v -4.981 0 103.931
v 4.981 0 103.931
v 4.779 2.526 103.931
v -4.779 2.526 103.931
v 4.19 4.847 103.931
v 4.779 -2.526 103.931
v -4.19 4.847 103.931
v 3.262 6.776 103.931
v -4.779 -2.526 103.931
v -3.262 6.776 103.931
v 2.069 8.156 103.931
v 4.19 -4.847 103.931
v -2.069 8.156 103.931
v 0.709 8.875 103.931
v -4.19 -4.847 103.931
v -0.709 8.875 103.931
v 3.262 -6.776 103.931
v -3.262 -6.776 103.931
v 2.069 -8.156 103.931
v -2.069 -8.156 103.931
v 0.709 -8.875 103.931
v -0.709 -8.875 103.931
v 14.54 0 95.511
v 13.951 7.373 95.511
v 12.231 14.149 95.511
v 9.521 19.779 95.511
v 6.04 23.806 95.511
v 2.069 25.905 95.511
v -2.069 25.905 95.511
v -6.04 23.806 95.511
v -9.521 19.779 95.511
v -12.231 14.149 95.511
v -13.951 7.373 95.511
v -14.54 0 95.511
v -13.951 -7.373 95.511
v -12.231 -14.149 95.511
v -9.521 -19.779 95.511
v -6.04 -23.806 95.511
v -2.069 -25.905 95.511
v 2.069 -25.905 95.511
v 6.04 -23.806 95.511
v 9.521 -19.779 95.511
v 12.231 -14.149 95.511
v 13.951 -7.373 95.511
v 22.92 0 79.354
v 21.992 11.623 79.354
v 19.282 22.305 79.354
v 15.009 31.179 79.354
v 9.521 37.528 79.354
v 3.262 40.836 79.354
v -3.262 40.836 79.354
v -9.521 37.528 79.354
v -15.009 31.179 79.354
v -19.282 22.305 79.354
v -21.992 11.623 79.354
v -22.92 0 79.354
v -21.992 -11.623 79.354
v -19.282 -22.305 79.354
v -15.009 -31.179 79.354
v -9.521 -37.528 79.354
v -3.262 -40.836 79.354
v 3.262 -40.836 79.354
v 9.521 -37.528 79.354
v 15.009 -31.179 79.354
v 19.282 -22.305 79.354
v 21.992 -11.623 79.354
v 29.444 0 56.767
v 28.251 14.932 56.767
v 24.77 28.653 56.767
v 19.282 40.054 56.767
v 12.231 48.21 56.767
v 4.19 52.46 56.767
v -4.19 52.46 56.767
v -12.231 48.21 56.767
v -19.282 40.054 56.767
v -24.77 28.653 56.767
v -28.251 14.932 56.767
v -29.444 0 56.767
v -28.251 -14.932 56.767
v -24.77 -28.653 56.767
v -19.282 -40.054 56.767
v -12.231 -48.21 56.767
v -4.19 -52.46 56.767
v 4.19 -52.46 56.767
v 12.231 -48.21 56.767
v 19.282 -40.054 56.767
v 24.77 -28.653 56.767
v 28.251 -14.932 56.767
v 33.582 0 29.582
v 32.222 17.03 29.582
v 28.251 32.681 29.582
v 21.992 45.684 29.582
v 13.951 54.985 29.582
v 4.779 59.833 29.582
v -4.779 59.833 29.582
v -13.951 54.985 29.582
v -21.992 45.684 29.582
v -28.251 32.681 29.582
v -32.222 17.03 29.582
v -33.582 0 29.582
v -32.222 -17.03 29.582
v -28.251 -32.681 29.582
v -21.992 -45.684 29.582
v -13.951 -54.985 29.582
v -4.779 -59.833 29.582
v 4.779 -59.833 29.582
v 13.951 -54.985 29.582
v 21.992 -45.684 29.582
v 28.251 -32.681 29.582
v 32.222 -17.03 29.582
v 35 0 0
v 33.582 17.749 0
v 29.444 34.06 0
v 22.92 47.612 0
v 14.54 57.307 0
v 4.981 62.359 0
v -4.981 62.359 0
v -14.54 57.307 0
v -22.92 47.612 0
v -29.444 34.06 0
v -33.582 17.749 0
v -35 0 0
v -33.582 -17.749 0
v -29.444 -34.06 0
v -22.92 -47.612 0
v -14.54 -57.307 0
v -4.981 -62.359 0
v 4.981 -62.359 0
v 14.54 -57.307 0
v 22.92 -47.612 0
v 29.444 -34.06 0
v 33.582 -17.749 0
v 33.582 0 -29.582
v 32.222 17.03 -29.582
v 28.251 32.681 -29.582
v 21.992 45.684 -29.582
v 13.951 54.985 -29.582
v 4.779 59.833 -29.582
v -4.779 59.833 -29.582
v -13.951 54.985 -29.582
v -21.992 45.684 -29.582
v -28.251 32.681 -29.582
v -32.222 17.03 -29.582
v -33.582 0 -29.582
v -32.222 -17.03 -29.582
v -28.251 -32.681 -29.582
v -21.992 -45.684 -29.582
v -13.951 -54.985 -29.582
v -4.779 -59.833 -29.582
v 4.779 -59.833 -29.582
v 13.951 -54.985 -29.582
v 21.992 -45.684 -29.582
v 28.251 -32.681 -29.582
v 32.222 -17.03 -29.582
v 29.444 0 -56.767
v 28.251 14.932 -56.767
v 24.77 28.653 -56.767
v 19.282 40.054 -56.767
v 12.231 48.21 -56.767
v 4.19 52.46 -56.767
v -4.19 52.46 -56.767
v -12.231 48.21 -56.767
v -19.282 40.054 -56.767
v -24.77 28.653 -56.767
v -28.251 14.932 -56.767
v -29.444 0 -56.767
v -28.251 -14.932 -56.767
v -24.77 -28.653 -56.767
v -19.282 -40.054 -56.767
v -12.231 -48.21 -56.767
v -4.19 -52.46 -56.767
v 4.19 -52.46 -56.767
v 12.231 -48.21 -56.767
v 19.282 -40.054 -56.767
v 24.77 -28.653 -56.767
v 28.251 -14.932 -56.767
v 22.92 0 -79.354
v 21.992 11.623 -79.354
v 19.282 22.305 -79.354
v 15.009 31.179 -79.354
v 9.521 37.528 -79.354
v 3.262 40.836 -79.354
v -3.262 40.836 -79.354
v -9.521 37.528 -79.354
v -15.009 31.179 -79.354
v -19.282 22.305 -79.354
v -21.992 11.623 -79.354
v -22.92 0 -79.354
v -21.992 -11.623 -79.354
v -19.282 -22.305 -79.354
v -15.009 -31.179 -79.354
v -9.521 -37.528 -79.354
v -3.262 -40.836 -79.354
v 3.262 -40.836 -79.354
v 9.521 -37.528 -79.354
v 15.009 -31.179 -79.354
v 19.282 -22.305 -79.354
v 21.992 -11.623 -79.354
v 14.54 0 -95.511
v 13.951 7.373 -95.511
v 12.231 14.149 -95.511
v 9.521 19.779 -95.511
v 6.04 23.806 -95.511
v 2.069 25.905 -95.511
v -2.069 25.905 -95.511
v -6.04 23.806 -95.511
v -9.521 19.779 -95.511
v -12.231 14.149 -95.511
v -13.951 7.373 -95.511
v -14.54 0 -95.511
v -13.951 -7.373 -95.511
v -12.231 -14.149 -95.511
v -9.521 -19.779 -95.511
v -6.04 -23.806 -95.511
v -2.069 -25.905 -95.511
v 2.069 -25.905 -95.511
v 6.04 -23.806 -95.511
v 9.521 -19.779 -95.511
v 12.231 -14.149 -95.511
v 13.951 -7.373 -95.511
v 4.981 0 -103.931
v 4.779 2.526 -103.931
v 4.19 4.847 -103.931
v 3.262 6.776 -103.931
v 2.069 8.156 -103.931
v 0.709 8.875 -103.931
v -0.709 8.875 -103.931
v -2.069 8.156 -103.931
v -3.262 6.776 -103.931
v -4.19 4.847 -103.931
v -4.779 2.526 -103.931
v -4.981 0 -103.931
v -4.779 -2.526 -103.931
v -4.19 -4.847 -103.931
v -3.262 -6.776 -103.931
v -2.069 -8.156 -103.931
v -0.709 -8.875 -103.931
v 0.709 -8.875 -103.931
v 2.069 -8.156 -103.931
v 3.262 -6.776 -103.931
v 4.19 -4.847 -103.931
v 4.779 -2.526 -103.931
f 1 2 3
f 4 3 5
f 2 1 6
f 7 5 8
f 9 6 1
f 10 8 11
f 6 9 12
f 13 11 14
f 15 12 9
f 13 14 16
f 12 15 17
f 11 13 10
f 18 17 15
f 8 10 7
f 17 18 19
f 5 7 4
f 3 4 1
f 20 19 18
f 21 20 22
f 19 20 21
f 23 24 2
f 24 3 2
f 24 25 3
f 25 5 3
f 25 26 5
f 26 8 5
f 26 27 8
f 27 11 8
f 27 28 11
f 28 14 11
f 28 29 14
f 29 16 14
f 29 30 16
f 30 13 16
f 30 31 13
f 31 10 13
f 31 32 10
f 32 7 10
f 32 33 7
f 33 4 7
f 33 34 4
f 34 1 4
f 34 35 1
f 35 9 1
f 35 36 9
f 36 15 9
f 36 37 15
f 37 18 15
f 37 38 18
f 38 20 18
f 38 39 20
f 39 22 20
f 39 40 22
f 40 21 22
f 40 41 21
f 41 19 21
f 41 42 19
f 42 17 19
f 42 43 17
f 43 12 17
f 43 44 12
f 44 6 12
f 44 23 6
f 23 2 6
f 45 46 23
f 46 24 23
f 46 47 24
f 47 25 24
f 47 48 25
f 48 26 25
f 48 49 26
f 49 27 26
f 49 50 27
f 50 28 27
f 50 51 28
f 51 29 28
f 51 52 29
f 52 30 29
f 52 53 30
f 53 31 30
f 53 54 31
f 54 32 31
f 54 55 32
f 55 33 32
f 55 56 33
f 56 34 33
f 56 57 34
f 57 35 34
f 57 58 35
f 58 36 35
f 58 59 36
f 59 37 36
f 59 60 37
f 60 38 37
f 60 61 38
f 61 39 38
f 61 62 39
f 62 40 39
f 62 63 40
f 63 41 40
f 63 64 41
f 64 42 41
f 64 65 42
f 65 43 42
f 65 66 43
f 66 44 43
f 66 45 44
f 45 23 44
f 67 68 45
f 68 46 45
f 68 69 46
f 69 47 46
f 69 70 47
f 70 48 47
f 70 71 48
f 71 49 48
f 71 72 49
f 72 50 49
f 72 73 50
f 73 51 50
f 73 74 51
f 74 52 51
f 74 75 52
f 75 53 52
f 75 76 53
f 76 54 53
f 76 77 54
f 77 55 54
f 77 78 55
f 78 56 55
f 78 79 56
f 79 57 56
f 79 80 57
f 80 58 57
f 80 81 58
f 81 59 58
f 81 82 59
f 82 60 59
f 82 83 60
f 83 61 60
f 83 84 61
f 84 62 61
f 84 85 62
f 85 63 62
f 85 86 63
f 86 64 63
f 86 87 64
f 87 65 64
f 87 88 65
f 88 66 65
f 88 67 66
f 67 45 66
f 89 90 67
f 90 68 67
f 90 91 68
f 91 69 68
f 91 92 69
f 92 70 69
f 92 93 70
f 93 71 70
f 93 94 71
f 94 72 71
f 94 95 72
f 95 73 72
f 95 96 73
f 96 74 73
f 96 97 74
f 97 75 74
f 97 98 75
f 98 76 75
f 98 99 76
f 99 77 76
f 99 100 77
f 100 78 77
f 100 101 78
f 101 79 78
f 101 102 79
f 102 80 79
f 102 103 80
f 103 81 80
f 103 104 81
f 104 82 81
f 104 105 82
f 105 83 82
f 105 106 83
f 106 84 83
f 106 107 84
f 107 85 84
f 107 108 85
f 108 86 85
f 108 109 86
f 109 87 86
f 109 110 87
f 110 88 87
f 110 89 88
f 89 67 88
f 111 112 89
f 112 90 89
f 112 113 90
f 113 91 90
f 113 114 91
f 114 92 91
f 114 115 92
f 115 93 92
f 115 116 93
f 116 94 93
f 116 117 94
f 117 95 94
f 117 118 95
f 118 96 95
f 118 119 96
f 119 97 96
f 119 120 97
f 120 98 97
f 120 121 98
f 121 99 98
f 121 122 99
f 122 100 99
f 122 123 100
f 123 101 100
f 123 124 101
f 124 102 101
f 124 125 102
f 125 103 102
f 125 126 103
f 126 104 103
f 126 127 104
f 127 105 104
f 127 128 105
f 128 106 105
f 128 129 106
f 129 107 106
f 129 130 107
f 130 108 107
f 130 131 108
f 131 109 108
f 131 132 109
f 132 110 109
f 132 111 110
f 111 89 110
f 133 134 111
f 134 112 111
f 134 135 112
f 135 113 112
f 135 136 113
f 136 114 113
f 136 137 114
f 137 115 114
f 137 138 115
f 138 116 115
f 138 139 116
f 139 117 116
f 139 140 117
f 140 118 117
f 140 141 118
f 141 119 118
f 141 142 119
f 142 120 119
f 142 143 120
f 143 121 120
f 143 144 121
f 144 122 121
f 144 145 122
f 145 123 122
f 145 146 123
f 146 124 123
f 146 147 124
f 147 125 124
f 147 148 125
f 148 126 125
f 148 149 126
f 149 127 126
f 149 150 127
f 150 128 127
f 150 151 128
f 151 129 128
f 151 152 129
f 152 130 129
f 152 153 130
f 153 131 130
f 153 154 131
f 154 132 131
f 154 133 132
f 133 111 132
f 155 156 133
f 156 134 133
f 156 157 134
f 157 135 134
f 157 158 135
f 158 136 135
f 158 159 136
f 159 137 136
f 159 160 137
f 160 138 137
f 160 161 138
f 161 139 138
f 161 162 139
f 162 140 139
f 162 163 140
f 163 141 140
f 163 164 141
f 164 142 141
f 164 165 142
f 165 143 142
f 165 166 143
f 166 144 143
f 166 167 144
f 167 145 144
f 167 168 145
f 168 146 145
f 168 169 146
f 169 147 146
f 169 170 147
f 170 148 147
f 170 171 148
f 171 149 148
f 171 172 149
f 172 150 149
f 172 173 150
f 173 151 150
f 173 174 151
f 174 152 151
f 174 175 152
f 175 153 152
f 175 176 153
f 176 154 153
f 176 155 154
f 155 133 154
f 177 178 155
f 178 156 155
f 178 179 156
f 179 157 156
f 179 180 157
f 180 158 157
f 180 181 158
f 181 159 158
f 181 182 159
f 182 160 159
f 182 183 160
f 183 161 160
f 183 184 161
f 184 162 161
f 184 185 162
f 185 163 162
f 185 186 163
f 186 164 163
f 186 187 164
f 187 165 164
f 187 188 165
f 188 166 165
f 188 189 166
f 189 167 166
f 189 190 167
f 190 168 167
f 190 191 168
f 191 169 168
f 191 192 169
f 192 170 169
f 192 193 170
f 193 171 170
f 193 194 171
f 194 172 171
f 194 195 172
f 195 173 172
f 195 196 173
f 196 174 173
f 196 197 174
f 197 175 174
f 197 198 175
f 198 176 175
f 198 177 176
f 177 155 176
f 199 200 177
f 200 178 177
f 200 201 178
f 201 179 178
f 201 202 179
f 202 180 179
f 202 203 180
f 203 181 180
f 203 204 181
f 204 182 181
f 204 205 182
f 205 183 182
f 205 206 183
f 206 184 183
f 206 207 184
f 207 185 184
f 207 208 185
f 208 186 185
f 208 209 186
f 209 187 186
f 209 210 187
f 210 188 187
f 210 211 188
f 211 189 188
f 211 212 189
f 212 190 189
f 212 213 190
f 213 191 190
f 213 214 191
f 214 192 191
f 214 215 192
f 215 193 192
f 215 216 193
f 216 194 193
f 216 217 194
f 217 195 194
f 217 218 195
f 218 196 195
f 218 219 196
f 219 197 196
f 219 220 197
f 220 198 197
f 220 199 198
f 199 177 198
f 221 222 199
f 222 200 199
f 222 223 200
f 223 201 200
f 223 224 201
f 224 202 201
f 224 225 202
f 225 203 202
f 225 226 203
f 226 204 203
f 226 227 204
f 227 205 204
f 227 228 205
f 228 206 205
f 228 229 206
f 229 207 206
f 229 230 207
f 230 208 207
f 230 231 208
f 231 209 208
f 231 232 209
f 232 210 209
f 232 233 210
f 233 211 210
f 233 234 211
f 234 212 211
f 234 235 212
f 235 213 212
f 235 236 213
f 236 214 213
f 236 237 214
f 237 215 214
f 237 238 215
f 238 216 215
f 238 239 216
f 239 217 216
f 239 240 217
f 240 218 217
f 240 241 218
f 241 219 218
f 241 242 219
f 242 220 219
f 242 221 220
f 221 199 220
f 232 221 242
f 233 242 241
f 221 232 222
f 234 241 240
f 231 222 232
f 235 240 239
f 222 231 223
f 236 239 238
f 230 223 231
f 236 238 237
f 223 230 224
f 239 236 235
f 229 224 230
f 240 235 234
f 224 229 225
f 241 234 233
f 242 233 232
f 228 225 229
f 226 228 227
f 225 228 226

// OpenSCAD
// Generated by SolidPython 1.0.1 on 2020-07-29 00:46:46


scale(v = [5, 9, 15]) {
	sphere(r = 7);
}
/***********************************************
*********      SolidPython code:      **********
************************************************
 
# import packages: SolidPython
from solid import *
from solid.utils import *
from itertools import chain, combinations, permutations


class Resize:

    def __init__(self, scad_file):
        self.scad_file = scad_file
        #self.scad_file = import_scad(scad_file)
        # cone/cylinder param:
        self.r1 = 0
        self.r2 = 0
        self.h = 0
        # rectangular prism param:
        self.w = 0
        self.l = 0
        # ellipse param:
        self.r = 0

    # import OpenScad code (file name corresponds to shape)


    # classify shape + parameters
    def assign(self, param1, param2, param3):
        if self.scad_file == 'cone.scad':
            self.r1 = param1
            self.r2 = param2
            self.h = param3
        elif self.scad_file == 'cylinder.scad':
            self.r1 = param1
            self.r2 = param2
            self.h = param3
        elif self.scad_file == 'rectangularPrism.scad':
            self.h = param1
            self.l = param2
            self.w = param3
        else:
            self.r = param1
            self.h = param2

    # resize parameters
    def iterate(self):
        x = range(3, 20, 2)
        i = 1
        if self.scad_file == 'cone.scad':
            tempList = list(permutations(x, 2))
            for temp in tempList:
                param1 = temp[0]
                param2 = temp[1]
                filepath = 'produced_scad_files/' + 'cone' + str(param1) + '_' + str(param2) + '_' + '.scad'
                scad_render_to_file(cylinder(h=param1, r1=param2, r2=0), filepath)

        elif self.scad_file == 'cylinder.scad':
            tempList = list(permutations(x, 3))
            for temp in tempList:
                param1 = temp[0]
                param2 = temp[1]
                filepath = 'produced_scad_files/' + 'cylinder' + str(param1) + '_' + str(param2) + '_' + '.scad'
                scad_render_to_file(cylinder(h=param1, r1=param2, r2=param2), filepath)

        elif self.scad_file == 'rectangularPrism.scad':
            tempList = list(permutations(x, 3))
            for temp in tempList:
                param1 = temp[0]
                param2 = temp[1]
                param3 = temp[2]
                filepath = 'produced_scad_files/' + 'rectangularPrism' + str(param1) + '_' + str(param2) + '_' + str(
                    param3) + '.scad'
                scad_render_to_file(cube(size=(param1, param2, param3)), filepath)

        elif self.scad_file == 'ellipse.scad':
            tempList = list(permutations(x, 4))
            for temp in tempList:
                param1 = temp[0]
                param2 = temp[1]
                param3 = temp[2]
                param4 = temp[3]
                filepath = 'produced_scad_files/' + 'ellipse' + str(param1) + '_' + str(param2) + '_' + str(param3) + '_' + str(param4) + '.scad'
                scad_render_to_file(scale([param1, param2, param3])(sphere(r=param4)), filepath)

    def render_to_scadfile(self):
        scad_render_to_file(scad, 'example.scad') 
 
************************************************/
